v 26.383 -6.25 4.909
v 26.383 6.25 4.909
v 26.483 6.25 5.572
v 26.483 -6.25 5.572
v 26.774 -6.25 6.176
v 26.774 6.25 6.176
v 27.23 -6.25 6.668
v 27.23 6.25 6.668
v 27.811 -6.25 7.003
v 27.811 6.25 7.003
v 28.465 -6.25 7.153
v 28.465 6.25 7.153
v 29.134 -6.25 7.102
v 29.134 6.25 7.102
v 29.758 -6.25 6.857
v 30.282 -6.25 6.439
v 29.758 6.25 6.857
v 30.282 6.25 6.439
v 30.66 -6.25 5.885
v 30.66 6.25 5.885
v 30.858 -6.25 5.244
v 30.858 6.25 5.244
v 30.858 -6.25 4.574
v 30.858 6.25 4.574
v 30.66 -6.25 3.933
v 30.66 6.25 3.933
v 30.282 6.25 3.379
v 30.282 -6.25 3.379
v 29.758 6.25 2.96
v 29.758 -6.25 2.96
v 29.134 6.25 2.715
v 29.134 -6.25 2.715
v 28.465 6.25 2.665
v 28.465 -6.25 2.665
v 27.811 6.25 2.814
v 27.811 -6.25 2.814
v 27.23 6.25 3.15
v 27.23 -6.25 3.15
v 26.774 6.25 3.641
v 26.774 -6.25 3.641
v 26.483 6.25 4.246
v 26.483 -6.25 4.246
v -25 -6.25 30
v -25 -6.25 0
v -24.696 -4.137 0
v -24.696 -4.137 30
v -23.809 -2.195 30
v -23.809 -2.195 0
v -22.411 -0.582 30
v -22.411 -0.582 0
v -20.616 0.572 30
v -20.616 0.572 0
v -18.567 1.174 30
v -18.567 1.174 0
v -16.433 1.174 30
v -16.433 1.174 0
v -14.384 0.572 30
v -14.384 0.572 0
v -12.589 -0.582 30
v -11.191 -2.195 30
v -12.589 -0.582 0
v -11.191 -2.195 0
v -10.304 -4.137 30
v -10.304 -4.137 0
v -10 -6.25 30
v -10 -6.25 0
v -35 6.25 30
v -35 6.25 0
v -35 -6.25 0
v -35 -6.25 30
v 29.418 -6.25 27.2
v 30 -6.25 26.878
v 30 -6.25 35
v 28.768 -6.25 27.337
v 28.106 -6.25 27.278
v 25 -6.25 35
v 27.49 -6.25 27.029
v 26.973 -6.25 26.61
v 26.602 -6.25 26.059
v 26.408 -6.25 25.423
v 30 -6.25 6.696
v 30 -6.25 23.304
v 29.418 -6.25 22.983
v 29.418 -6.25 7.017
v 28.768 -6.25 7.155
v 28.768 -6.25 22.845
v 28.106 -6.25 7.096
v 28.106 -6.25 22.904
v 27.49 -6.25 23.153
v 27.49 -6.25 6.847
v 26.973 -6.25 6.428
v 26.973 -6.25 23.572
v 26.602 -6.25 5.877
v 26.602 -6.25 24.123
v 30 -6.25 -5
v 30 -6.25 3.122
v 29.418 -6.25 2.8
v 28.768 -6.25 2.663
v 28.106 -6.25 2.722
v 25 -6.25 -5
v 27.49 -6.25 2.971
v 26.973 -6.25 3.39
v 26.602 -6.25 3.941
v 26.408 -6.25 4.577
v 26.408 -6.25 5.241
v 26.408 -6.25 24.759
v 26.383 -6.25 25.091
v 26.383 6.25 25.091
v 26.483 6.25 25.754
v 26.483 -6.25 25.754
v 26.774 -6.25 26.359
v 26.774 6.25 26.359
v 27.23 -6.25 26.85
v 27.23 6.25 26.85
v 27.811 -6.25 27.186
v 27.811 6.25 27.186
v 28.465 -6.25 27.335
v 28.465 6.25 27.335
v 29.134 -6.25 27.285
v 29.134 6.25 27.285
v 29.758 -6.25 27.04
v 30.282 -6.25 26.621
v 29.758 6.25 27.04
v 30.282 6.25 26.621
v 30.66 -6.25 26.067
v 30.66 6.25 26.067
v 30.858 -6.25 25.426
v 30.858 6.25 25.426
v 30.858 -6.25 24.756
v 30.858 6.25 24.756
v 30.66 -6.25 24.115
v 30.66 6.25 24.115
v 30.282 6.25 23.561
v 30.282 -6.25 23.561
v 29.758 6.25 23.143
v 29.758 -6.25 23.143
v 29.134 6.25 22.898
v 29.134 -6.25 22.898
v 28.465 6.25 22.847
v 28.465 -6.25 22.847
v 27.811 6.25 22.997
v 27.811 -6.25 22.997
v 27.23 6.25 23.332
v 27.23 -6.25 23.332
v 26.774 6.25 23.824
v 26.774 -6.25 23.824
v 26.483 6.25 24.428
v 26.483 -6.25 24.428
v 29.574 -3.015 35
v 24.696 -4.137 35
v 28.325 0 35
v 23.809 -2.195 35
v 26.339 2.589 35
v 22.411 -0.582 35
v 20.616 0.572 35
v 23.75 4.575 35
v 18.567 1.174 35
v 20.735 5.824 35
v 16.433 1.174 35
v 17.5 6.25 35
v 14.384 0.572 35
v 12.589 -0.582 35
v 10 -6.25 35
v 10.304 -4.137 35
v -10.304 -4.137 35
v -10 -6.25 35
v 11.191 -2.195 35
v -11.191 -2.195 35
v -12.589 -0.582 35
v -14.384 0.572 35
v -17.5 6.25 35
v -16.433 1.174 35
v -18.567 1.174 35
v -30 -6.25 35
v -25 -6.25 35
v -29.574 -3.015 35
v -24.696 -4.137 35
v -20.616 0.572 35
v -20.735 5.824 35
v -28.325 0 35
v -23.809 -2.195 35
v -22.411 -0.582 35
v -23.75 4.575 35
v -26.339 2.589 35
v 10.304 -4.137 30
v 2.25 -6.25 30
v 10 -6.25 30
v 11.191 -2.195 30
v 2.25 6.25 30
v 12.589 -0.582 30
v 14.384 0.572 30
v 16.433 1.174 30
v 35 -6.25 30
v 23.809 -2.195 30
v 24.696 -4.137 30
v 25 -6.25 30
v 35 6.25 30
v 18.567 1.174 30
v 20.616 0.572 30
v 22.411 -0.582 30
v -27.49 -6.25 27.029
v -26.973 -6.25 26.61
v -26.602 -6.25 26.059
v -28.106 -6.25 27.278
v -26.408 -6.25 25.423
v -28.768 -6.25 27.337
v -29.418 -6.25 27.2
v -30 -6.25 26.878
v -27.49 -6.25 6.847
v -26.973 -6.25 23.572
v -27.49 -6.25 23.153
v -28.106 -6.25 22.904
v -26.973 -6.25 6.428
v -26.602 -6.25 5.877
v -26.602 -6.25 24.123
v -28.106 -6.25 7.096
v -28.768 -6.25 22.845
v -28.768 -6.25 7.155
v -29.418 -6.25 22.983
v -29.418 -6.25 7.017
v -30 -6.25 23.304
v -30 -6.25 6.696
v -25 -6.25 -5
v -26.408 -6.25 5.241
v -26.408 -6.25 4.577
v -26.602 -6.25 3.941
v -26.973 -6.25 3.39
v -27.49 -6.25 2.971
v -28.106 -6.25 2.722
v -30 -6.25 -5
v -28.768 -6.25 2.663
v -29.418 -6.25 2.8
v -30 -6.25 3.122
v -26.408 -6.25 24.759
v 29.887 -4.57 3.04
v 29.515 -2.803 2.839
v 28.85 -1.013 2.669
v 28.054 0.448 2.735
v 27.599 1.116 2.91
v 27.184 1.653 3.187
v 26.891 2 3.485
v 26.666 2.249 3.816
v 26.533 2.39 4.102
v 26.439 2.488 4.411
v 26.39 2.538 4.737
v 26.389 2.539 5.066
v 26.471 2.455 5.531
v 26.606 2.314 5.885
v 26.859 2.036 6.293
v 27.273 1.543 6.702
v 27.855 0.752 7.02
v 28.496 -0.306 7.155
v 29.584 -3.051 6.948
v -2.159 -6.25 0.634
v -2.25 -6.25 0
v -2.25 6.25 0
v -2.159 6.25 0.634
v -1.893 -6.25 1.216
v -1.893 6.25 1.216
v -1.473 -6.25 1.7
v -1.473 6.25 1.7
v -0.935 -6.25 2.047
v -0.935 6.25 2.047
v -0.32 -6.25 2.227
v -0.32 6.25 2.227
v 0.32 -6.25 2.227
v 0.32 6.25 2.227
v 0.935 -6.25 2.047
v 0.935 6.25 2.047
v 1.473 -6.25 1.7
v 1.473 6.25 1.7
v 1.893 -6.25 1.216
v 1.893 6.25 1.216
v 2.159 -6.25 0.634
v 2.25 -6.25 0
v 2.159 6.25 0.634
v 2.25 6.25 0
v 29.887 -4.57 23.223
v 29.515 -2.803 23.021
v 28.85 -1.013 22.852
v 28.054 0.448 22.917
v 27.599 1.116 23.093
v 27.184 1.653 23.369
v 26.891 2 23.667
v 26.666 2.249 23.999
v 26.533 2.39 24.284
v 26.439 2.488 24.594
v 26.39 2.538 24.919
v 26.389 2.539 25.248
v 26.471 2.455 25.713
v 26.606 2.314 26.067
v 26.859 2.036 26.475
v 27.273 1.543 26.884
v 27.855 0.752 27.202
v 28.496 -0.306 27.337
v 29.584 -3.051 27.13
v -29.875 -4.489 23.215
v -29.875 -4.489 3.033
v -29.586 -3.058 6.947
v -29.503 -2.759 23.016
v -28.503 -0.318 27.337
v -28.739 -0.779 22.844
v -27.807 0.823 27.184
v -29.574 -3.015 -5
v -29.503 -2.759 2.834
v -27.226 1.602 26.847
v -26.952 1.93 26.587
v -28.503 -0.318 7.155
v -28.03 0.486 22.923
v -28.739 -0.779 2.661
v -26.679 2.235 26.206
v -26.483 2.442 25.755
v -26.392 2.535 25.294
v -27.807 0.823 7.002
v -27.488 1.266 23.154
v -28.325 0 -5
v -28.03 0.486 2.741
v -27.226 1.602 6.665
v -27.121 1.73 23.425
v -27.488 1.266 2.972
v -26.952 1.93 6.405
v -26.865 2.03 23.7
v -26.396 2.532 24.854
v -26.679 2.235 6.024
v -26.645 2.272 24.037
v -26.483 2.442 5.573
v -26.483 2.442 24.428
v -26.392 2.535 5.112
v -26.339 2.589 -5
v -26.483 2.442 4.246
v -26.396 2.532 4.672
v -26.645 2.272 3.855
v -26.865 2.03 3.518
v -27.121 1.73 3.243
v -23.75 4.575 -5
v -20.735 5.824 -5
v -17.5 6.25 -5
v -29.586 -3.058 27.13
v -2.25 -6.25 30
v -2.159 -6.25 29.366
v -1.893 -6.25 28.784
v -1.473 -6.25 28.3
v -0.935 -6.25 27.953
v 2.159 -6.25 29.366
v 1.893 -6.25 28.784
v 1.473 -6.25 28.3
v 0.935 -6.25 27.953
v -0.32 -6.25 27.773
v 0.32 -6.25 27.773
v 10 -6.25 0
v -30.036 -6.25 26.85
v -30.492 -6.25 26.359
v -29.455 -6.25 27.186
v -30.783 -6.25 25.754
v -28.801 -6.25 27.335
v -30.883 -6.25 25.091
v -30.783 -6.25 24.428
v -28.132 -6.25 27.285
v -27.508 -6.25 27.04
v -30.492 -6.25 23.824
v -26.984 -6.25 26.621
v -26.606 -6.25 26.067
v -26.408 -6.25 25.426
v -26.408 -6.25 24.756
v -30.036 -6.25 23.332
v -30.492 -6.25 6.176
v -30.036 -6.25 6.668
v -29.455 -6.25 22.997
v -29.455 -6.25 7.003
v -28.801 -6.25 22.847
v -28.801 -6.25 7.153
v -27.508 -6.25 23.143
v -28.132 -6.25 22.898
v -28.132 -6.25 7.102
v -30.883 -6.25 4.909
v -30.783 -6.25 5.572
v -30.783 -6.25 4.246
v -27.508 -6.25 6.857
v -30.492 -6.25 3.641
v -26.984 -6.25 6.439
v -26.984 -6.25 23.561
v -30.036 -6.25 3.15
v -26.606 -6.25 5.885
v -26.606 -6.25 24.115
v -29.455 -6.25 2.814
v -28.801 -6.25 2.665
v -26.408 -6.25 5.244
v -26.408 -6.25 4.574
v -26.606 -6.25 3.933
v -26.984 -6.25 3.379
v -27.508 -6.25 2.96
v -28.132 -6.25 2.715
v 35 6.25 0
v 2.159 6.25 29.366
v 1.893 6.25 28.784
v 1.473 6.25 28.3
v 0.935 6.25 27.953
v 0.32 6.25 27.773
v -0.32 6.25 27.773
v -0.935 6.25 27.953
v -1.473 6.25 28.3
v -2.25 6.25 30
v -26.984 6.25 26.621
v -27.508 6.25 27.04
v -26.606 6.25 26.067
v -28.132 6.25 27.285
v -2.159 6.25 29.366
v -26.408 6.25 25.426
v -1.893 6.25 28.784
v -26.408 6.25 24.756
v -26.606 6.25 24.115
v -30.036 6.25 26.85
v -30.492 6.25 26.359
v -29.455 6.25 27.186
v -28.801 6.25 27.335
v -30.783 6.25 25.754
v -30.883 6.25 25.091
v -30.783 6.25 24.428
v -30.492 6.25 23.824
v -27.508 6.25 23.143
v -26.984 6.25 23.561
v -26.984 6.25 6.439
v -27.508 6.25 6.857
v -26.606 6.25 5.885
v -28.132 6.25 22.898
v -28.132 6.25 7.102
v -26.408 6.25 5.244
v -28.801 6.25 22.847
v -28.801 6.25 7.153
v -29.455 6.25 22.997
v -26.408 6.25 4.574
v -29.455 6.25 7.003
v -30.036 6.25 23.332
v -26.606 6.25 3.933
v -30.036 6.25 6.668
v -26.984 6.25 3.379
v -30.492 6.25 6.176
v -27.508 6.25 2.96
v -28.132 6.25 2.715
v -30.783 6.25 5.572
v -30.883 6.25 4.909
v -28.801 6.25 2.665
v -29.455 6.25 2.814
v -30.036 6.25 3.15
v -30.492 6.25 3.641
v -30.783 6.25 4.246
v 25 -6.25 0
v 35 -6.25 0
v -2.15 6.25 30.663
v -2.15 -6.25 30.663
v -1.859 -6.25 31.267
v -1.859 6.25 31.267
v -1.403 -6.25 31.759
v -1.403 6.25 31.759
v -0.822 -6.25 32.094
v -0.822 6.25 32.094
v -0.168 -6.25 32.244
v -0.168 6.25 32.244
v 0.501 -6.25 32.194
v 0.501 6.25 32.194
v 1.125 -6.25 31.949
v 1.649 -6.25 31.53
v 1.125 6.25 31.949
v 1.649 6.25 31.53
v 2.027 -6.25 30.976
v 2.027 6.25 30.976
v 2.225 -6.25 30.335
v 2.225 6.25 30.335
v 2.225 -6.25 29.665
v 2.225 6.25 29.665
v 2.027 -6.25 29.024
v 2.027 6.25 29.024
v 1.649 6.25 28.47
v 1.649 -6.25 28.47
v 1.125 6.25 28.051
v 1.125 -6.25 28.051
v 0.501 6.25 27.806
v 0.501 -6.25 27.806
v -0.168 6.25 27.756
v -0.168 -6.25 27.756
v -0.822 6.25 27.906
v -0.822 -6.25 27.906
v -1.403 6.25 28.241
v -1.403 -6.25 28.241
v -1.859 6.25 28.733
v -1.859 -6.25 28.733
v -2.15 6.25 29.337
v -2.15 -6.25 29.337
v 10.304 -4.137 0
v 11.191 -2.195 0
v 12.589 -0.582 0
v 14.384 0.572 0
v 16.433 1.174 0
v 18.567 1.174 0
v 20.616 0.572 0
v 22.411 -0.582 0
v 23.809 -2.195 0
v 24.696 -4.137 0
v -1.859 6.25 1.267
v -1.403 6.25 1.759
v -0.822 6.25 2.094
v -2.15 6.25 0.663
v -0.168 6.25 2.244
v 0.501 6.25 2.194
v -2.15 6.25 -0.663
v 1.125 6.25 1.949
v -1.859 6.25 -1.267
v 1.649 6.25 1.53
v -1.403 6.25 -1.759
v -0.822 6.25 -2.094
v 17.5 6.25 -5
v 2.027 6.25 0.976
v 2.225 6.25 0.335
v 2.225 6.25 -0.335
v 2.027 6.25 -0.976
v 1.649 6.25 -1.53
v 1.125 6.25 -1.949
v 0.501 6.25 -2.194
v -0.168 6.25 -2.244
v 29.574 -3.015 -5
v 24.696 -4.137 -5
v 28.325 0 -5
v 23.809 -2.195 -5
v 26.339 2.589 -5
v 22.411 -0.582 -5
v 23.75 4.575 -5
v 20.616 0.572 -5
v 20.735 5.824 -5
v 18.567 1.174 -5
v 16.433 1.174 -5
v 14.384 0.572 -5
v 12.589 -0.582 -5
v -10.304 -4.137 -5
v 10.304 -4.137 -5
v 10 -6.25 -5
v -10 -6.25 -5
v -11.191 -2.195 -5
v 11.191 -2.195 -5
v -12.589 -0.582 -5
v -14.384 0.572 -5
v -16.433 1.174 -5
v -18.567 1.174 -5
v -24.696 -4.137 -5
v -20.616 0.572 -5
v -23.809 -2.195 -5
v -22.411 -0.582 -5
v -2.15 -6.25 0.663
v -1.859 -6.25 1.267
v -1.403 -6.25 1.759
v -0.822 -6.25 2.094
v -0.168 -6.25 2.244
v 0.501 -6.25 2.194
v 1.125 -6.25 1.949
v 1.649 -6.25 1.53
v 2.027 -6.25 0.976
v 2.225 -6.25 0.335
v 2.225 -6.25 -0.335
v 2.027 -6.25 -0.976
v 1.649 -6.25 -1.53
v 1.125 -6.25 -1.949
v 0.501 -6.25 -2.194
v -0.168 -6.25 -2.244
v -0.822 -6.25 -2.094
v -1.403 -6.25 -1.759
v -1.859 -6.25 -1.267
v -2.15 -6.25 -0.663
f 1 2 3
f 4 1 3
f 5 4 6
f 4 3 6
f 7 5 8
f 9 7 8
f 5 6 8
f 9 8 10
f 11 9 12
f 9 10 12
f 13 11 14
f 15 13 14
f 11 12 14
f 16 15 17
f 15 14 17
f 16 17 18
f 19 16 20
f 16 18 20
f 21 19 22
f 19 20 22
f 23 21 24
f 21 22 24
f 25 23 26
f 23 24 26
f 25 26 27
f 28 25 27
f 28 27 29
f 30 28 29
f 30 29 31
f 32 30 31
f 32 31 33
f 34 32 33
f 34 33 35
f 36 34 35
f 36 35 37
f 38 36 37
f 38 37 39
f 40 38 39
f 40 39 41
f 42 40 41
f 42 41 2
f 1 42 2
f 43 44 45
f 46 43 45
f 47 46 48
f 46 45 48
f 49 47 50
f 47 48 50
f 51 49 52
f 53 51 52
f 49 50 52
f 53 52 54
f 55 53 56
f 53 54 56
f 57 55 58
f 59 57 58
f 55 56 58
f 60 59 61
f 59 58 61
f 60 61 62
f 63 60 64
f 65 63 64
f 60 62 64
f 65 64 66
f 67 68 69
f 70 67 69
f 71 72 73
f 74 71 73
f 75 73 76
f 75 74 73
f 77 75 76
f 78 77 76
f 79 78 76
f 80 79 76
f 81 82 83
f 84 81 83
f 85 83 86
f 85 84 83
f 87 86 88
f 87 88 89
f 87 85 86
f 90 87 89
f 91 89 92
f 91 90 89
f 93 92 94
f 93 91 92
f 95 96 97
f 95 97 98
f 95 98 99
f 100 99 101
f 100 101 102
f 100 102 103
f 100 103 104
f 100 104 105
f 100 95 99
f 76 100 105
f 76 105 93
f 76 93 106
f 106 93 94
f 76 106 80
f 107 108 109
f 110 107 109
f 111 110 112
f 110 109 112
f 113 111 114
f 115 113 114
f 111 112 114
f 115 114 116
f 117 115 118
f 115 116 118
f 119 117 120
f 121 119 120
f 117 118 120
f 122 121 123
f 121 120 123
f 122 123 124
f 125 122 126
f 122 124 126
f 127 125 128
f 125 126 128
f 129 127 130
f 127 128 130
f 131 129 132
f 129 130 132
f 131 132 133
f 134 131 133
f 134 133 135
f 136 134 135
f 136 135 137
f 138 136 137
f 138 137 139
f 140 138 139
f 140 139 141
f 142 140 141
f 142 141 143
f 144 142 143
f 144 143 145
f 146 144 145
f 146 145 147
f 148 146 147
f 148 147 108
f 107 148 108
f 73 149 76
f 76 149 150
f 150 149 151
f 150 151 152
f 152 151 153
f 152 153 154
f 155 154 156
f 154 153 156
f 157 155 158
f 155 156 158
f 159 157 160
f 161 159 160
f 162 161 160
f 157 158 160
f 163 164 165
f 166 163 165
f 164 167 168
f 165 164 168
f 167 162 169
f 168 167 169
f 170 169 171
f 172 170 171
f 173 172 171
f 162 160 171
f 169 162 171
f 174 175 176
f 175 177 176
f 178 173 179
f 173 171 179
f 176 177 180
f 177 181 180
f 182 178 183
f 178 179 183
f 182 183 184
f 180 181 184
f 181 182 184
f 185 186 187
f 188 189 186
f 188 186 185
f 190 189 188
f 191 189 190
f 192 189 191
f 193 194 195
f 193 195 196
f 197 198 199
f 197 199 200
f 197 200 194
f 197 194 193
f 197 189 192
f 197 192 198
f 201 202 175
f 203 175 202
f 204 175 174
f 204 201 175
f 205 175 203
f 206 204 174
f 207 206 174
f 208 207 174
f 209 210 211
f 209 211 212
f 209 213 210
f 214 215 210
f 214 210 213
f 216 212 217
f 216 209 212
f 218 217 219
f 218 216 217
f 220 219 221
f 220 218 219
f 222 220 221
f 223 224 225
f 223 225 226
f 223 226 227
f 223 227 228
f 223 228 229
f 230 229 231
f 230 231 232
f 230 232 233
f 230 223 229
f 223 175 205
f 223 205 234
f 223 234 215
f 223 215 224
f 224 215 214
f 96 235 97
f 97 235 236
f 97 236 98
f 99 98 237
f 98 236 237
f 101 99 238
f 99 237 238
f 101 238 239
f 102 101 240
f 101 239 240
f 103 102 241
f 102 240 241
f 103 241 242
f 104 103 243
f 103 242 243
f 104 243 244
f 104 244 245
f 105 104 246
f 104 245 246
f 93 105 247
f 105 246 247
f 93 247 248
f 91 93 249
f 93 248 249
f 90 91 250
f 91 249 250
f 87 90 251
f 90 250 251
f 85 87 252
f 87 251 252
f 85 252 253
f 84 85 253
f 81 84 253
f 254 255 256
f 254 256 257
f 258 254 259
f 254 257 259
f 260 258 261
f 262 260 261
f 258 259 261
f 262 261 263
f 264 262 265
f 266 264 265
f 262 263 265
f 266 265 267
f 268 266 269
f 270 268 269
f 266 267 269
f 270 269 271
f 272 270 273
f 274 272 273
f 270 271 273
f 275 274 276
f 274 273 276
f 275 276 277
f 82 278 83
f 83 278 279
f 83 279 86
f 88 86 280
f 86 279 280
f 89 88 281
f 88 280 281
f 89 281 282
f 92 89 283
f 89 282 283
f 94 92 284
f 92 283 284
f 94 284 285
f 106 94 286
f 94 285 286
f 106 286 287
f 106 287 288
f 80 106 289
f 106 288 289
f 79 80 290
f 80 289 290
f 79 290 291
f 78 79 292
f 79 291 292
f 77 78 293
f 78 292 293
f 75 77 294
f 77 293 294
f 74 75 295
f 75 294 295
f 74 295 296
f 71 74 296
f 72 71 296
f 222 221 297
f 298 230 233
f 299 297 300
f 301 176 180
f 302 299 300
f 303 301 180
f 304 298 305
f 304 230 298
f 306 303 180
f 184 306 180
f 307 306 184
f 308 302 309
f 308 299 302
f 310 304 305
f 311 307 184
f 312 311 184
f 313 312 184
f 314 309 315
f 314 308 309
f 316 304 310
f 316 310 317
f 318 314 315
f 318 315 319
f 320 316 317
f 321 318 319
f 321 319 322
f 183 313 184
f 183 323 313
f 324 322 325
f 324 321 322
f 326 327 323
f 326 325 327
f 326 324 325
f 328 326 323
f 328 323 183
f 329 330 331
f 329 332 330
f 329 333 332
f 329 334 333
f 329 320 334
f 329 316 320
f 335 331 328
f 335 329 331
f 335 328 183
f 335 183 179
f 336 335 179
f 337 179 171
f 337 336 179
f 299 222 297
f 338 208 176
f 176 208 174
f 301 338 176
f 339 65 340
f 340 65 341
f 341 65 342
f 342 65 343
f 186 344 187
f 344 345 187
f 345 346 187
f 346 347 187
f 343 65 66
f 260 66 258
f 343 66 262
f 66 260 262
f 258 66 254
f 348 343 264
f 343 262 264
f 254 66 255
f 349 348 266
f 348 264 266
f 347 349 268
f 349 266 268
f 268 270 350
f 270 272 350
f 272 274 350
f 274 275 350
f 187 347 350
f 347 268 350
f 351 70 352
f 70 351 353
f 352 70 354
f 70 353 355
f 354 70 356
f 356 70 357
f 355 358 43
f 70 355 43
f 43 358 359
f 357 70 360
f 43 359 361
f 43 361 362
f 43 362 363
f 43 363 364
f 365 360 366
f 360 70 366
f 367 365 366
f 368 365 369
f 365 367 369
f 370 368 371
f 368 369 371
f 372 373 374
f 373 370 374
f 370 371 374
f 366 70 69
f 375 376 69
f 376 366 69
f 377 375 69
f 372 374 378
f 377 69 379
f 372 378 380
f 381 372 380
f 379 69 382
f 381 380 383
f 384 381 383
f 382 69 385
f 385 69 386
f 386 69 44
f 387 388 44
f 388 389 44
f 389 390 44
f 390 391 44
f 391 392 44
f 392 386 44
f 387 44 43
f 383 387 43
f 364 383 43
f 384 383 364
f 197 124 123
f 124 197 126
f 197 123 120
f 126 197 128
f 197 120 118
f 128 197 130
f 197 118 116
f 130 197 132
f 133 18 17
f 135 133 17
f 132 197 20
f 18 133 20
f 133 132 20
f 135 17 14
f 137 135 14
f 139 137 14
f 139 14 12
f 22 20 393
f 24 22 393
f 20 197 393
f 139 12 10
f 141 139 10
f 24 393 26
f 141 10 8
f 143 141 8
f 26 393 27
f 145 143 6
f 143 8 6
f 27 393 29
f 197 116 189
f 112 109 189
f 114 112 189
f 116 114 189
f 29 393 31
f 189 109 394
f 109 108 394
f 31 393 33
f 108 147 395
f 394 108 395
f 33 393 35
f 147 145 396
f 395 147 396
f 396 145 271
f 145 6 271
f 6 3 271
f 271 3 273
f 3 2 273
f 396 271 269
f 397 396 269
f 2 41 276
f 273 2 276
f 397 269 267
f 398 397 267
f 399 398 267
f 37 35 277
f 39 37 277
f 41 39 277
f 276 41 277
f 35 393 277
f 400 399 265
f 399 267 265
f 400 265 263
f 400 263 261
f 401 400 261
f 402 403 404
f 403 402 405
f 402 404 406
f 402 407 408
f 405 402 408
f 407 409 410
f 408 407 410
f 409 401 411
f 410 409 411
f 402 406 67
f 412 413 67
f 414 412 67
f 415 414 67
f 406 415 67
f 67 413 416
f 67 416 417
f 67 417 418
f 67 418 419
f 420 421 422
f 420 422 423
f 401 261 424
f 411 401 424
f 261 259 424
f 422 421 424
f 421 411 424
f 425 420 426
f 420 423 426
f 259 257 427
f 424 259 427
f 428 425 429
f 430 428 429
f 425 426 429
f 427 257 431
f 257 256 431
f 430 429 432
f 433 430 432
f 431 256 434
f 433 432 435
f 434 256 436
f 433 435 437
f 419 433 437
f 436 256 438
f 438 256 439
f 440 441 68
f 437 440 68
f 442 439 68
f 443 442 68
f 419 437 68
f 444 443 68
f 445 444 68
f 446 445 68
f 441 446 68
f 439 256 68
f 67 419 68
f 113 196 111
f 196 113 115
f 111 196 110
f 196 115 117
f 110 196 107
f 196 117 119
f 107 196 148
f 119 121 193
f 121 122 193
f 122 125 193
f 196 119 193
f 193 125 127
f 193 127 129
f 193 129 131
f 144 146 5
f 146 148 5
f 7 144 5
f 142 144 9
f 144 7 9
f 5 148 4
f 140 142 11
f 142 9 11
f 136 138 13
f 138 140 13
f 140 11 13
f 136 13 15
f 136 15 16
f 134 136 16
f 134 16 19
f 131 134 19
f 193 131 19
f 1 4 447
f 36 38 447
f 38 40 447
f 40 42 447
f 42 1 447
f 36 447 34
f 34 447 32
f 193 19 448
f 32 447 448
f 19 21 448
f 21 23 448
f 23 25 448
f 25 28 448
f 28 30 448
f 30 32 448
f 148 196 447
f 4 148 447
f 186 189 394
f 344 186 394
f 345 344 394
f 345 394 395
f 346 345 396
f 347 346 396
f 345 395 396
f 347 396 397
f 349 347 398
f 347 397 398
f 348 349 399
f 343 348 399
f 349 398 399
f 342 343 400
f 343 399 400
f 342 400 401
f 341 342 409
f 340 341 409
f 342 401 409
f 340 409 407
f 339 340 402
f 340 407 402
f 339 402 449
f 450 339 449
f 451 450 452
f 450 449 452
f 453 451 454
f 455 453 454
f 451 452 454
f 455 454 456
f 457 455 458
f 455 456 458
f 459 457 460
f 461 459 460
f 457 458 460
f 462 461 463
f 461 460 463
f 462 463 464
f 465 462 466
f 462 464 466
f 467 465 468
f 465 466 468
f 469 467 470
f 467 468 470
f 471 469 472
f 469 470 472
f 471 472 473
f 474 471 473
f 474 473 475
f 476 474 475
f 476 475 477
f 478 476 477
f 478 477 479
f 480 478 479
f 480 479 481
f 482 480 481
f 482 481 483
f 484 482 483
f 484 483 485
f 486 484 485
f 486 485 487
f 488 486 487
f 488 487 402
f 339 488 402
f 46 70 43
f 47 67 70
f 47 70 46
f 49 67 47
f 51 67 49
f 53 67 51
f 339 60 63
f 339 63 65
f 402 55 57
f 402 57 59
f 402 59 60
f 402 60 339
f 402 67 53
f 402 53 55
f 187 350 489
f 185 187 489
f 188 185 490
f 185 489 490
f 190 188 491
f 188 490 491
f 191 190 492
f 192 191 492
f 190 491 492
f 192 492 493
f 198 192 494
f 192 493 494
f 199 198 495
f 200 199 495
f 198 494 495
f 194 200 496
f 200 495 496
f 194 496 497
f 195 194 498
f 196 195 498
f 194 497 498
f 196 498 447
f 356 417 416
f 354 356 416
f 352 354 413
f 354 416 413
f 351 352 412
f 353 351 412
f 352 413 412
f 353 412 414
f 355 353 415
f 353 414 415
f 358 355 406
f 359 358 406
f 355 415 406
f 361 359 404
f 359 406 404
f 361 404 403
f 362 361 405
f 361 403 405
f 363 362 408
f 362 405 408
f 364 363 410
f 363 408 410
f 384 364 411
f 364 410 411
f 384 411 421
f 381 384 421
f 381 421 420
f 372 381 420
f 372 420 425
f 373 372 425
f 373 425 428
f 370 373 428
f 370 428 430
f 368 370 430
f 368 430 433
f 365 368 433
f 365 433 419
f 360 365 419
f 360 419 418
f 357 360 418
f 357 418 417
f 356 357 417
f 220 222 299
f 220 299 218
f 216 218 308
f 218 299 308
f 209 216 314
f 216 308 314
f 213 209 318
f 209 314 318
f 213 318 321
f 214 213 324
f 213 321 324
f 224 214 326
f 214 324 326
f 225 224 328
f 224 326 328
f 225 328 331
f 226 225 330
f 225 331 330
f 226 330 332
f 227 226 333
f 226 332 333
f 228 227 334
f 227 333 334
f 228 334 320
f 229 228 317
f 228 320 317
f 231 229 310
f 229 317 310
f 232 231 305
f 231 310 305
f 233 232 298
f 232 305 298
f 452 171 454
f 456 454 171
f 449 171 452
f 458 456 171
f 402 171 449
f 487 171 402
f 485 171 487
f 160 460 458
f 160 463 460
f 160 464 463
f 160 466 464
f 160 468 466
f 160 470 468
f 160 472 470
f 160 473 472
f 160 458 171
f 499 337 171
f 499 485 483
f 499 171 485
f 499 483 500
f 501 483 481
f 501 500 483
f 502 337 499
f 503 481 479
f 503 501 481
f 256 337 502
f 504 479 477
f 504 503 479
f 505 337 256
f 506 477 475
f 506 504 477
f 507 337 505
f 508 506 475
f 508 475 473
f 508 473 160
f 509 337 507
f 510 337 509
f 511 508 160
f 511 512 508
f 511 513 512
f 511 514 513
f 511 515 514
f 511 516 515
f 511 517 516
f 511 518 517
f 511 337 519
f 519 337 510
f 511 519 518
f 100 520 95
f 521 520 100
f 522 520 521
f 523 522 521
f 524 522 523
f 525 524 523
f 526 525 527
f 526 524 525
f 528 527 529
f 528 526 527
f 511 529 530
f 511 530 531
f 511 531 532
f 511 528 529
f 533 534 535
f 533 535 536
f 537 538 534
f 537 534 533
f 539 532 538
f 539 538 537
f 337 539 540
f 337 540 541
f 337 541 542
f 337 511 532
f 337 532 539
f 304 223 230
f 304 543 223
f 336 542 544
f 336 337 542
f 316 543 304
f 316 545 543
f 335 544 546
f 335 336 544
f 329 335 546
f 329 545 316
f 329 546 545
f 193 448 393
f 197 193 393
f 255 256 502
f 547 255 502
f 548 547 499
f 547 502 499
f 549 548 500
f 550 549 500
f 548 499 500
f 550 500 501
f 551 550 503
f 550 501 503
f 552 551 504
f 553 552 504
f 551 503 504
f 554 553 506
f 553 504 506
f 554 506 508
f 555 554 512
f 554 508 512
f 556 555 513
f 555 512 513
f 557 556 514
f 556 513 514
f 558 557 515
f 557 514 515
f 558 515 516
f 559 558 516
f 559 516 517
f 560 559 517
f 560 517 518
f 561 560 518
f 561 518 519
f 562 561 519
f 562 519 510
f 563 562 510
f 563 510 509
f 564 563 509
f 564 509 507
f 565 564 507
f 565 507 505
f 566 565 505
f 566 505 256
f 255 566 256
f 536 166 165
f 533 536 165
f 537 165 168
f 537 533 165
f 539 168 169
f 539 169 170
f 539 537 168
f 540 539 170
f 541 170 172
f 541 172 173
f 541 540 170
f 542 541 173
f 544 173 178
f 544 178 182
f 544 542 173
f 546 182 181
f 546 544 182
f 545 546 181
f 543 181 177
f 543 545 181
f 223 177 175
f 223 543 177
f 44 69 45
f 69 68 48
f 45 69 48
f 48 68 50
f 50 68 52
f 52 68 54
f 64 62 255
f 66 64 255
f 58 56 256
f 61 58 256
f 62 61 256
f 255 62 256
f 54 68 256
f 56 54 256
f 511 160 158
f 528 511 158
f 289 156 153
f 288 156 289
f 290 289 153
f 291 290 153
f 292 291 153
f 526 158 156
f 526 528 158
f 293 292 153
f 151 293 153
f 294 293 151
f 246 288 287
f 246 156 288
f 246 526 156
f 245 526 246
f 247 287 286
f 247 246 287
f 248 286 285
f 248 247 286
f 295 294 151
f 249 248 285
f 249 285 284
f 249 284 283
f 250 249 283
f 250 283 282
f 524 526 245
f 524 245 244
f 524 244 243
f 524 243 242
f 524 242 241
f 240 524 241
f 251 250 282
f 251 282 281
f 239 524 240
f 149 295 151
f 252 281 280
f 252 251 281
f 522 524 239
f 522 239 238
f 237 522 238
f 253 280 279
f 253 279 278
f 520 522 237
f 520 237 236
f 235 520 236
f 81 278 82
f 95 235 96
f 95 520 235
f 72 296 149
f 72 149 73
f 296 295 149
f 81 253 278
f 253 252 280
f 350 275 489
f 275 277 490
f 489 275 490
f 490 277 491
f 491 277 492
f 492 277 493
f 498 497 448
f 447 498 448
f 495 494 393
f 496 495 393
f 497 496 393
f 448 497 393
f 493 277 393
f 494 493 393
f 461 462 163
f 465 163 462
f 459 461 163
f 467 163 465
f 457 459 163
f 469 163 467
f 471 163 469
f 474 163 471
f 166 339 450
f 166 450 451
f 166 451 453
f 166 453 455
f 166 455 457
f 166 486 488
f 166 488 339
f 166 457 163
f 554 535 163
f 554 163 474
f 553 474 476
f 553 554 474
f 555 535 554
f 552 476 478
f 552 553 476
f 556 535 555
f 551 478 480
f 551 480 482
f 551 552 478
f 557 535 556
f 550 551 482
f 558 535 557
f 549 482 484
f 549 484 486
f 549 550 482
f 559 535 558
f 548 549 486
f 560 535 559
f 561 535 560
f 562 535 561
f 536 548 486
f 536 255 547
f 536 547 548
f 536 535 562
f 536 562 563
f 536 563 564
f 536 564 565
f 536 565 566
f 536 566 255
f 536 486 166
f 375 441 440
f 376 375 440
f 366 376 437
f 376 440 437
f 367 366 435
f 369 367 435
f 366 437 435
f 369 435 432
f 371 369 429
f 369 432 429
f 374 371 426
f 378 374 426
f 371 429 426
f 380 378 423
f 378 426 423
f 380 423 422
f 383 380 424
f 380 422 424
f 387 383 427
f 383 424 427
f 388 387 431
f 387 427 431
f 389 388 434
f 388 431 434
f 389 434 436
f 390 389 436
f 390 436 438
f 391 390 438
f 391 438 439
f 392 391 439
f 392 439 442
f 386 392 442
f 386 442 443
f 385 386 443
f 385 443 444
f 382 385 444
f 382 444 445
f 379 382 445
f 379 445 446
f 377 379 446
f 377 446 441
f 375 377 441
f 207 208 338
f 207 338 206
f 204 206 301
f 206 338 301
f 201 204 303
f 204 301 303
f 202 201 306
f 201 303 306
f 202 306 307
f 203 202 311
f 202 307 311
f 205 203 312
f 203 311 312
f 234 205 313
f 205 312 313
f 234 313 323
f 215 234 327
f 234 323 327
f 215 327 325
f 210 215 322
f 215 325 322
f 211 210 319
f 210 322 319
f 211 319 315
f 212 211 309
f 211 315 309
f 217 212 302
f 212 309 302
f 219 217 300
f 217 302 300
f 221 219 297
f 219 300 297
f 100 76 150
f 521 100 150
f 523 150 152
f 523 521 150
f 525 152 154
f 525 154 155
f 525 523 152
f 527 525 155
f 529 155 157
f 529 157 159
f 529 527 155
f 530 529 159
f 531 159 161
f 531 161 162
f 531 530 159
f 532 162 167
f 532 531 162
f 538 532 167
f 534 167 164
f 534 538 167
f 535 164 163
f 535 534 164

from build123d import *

# Parameters (mm, degrees)
BOSS_EXTRUDE1_DEPTH      = 30
BOSS_EXTRUDE2_DEPTH      = 5
BOSS_EXTRUDE2_DEPTH_BACK = 35
SKETCH3_R                = 2.25
CUT_EXTRUDE1_DEPTH       = 52.051444642


with BuildPart() as part:
    # Sketch1 → Boss-Extrude1 (new body)
    with BuildSketch(Plane.XY):
        with BuildLine():
            Line((-10, -6.25), (10, -6.25))
            ThreePointArc((10, -6.25), (17.5, 1.25), (25, -6.25))
            Line((25, -6.25), (35, -6.25))
            Line((35, -6.25), (35, 6.25))
            Line((35, 6.25), (-35, 6.25))
            Line((-35, 6.25), (-35, -6.25))
            Line((-35, -6.25), (-25, -6.25))
            ThreePointArc((-25, -6.25), (-17.5, 1.25), (-10, -6.25))
        make_face()
    extrude(amount=BOSS_EXTRUDE1_DEPTH)


with BuildPart() as body_2:
    # Sketch2 → Boss-Extrude2 (new, two sides: drawn at the far end of the back side and taken through both)
    with BuildSketch(Plane.XY.offset(30).offset(-BOSS_EXTRUDE2_DEPTH_BACK)):
        with BuildLine():
            Line((-25, -6.25), (-30, -6.25))
            ThreePointArc((-30, -6.25), (-26.338834765, 2.588834765), (-17.5, 6.25))
            Line((-17.5, 6.25), (17.5, 6.25))
            ThreePointArc((17.5, 6.25), (26.338834765, 2.588834765), (30, -6.25))
            Line((30, -6.25), (25, -6.25))
            ThreePointArc((25, -6.25), (17.5, 1.25), (10, -6.25))
            Line((10, -6.25), (-10, -6.25))
            ThreePointArc((-10, -6.25), (-17.5, 1.25), (-25, -6.25))
        make_face()
    extrude(amount=BOSS_EXTRUDE2_DEPTH + BOSS_EXTRUDE2_DEPTH_BACK)


with BuildPart() as cut_extrude1_tool:
    # Sketch3 → Cut-Extrude1 (new, through all)
    with BuildSketch(Plane(origin=(0, 6.25, 0), x_dir=(1, 0, 0), z_dir=(0, 1, 0))):
        with Locations(Location((0, 0, 0), (0, 0, 180))):
            Circle(SKETCH3_R)
        with Locations(Location((-28.633056951, -4.908908195, 0), (0, 0, 180))):
            Circle(SKETCH3_R)
        with Locations(Location((28.633056951, -4.908908195, 0), (0, 0, 180))):
            Circle(SKETCH3_R)
        with Locations(Location((28.633056951, -25.091091805, 0), (0, 0, 180))):
            Circle(SKETCH3_R)
        with Locations(Location((0, -30, 0), (0, 0, 180))):
            Circle(SKETCH3_R)
        with Locations(Location((-28.633056951, -25.091091805, 0), (0, 0, 180))):
            Circle(SKETCH3_R)
    extrude(amount=-CUT_EXTRUDE1_DEPTH)


with BuildPart() as part_1:
    add(part.part)

    # Cut-Extrude1: cut by cut_extrude1_tool
    add(cut_extrude1_tool.part, mode=Mode.SUBTRACT)


with BuildPart() as body_2_1:
    add(body_2.part)

    # Cut-Extrude1: cut by cut_extrude1_tool
    add(cut_extrude1_tool.part, mode=Mode.SUBTRACT)


solid = Compound([part_1.part, body_2_1.part])
